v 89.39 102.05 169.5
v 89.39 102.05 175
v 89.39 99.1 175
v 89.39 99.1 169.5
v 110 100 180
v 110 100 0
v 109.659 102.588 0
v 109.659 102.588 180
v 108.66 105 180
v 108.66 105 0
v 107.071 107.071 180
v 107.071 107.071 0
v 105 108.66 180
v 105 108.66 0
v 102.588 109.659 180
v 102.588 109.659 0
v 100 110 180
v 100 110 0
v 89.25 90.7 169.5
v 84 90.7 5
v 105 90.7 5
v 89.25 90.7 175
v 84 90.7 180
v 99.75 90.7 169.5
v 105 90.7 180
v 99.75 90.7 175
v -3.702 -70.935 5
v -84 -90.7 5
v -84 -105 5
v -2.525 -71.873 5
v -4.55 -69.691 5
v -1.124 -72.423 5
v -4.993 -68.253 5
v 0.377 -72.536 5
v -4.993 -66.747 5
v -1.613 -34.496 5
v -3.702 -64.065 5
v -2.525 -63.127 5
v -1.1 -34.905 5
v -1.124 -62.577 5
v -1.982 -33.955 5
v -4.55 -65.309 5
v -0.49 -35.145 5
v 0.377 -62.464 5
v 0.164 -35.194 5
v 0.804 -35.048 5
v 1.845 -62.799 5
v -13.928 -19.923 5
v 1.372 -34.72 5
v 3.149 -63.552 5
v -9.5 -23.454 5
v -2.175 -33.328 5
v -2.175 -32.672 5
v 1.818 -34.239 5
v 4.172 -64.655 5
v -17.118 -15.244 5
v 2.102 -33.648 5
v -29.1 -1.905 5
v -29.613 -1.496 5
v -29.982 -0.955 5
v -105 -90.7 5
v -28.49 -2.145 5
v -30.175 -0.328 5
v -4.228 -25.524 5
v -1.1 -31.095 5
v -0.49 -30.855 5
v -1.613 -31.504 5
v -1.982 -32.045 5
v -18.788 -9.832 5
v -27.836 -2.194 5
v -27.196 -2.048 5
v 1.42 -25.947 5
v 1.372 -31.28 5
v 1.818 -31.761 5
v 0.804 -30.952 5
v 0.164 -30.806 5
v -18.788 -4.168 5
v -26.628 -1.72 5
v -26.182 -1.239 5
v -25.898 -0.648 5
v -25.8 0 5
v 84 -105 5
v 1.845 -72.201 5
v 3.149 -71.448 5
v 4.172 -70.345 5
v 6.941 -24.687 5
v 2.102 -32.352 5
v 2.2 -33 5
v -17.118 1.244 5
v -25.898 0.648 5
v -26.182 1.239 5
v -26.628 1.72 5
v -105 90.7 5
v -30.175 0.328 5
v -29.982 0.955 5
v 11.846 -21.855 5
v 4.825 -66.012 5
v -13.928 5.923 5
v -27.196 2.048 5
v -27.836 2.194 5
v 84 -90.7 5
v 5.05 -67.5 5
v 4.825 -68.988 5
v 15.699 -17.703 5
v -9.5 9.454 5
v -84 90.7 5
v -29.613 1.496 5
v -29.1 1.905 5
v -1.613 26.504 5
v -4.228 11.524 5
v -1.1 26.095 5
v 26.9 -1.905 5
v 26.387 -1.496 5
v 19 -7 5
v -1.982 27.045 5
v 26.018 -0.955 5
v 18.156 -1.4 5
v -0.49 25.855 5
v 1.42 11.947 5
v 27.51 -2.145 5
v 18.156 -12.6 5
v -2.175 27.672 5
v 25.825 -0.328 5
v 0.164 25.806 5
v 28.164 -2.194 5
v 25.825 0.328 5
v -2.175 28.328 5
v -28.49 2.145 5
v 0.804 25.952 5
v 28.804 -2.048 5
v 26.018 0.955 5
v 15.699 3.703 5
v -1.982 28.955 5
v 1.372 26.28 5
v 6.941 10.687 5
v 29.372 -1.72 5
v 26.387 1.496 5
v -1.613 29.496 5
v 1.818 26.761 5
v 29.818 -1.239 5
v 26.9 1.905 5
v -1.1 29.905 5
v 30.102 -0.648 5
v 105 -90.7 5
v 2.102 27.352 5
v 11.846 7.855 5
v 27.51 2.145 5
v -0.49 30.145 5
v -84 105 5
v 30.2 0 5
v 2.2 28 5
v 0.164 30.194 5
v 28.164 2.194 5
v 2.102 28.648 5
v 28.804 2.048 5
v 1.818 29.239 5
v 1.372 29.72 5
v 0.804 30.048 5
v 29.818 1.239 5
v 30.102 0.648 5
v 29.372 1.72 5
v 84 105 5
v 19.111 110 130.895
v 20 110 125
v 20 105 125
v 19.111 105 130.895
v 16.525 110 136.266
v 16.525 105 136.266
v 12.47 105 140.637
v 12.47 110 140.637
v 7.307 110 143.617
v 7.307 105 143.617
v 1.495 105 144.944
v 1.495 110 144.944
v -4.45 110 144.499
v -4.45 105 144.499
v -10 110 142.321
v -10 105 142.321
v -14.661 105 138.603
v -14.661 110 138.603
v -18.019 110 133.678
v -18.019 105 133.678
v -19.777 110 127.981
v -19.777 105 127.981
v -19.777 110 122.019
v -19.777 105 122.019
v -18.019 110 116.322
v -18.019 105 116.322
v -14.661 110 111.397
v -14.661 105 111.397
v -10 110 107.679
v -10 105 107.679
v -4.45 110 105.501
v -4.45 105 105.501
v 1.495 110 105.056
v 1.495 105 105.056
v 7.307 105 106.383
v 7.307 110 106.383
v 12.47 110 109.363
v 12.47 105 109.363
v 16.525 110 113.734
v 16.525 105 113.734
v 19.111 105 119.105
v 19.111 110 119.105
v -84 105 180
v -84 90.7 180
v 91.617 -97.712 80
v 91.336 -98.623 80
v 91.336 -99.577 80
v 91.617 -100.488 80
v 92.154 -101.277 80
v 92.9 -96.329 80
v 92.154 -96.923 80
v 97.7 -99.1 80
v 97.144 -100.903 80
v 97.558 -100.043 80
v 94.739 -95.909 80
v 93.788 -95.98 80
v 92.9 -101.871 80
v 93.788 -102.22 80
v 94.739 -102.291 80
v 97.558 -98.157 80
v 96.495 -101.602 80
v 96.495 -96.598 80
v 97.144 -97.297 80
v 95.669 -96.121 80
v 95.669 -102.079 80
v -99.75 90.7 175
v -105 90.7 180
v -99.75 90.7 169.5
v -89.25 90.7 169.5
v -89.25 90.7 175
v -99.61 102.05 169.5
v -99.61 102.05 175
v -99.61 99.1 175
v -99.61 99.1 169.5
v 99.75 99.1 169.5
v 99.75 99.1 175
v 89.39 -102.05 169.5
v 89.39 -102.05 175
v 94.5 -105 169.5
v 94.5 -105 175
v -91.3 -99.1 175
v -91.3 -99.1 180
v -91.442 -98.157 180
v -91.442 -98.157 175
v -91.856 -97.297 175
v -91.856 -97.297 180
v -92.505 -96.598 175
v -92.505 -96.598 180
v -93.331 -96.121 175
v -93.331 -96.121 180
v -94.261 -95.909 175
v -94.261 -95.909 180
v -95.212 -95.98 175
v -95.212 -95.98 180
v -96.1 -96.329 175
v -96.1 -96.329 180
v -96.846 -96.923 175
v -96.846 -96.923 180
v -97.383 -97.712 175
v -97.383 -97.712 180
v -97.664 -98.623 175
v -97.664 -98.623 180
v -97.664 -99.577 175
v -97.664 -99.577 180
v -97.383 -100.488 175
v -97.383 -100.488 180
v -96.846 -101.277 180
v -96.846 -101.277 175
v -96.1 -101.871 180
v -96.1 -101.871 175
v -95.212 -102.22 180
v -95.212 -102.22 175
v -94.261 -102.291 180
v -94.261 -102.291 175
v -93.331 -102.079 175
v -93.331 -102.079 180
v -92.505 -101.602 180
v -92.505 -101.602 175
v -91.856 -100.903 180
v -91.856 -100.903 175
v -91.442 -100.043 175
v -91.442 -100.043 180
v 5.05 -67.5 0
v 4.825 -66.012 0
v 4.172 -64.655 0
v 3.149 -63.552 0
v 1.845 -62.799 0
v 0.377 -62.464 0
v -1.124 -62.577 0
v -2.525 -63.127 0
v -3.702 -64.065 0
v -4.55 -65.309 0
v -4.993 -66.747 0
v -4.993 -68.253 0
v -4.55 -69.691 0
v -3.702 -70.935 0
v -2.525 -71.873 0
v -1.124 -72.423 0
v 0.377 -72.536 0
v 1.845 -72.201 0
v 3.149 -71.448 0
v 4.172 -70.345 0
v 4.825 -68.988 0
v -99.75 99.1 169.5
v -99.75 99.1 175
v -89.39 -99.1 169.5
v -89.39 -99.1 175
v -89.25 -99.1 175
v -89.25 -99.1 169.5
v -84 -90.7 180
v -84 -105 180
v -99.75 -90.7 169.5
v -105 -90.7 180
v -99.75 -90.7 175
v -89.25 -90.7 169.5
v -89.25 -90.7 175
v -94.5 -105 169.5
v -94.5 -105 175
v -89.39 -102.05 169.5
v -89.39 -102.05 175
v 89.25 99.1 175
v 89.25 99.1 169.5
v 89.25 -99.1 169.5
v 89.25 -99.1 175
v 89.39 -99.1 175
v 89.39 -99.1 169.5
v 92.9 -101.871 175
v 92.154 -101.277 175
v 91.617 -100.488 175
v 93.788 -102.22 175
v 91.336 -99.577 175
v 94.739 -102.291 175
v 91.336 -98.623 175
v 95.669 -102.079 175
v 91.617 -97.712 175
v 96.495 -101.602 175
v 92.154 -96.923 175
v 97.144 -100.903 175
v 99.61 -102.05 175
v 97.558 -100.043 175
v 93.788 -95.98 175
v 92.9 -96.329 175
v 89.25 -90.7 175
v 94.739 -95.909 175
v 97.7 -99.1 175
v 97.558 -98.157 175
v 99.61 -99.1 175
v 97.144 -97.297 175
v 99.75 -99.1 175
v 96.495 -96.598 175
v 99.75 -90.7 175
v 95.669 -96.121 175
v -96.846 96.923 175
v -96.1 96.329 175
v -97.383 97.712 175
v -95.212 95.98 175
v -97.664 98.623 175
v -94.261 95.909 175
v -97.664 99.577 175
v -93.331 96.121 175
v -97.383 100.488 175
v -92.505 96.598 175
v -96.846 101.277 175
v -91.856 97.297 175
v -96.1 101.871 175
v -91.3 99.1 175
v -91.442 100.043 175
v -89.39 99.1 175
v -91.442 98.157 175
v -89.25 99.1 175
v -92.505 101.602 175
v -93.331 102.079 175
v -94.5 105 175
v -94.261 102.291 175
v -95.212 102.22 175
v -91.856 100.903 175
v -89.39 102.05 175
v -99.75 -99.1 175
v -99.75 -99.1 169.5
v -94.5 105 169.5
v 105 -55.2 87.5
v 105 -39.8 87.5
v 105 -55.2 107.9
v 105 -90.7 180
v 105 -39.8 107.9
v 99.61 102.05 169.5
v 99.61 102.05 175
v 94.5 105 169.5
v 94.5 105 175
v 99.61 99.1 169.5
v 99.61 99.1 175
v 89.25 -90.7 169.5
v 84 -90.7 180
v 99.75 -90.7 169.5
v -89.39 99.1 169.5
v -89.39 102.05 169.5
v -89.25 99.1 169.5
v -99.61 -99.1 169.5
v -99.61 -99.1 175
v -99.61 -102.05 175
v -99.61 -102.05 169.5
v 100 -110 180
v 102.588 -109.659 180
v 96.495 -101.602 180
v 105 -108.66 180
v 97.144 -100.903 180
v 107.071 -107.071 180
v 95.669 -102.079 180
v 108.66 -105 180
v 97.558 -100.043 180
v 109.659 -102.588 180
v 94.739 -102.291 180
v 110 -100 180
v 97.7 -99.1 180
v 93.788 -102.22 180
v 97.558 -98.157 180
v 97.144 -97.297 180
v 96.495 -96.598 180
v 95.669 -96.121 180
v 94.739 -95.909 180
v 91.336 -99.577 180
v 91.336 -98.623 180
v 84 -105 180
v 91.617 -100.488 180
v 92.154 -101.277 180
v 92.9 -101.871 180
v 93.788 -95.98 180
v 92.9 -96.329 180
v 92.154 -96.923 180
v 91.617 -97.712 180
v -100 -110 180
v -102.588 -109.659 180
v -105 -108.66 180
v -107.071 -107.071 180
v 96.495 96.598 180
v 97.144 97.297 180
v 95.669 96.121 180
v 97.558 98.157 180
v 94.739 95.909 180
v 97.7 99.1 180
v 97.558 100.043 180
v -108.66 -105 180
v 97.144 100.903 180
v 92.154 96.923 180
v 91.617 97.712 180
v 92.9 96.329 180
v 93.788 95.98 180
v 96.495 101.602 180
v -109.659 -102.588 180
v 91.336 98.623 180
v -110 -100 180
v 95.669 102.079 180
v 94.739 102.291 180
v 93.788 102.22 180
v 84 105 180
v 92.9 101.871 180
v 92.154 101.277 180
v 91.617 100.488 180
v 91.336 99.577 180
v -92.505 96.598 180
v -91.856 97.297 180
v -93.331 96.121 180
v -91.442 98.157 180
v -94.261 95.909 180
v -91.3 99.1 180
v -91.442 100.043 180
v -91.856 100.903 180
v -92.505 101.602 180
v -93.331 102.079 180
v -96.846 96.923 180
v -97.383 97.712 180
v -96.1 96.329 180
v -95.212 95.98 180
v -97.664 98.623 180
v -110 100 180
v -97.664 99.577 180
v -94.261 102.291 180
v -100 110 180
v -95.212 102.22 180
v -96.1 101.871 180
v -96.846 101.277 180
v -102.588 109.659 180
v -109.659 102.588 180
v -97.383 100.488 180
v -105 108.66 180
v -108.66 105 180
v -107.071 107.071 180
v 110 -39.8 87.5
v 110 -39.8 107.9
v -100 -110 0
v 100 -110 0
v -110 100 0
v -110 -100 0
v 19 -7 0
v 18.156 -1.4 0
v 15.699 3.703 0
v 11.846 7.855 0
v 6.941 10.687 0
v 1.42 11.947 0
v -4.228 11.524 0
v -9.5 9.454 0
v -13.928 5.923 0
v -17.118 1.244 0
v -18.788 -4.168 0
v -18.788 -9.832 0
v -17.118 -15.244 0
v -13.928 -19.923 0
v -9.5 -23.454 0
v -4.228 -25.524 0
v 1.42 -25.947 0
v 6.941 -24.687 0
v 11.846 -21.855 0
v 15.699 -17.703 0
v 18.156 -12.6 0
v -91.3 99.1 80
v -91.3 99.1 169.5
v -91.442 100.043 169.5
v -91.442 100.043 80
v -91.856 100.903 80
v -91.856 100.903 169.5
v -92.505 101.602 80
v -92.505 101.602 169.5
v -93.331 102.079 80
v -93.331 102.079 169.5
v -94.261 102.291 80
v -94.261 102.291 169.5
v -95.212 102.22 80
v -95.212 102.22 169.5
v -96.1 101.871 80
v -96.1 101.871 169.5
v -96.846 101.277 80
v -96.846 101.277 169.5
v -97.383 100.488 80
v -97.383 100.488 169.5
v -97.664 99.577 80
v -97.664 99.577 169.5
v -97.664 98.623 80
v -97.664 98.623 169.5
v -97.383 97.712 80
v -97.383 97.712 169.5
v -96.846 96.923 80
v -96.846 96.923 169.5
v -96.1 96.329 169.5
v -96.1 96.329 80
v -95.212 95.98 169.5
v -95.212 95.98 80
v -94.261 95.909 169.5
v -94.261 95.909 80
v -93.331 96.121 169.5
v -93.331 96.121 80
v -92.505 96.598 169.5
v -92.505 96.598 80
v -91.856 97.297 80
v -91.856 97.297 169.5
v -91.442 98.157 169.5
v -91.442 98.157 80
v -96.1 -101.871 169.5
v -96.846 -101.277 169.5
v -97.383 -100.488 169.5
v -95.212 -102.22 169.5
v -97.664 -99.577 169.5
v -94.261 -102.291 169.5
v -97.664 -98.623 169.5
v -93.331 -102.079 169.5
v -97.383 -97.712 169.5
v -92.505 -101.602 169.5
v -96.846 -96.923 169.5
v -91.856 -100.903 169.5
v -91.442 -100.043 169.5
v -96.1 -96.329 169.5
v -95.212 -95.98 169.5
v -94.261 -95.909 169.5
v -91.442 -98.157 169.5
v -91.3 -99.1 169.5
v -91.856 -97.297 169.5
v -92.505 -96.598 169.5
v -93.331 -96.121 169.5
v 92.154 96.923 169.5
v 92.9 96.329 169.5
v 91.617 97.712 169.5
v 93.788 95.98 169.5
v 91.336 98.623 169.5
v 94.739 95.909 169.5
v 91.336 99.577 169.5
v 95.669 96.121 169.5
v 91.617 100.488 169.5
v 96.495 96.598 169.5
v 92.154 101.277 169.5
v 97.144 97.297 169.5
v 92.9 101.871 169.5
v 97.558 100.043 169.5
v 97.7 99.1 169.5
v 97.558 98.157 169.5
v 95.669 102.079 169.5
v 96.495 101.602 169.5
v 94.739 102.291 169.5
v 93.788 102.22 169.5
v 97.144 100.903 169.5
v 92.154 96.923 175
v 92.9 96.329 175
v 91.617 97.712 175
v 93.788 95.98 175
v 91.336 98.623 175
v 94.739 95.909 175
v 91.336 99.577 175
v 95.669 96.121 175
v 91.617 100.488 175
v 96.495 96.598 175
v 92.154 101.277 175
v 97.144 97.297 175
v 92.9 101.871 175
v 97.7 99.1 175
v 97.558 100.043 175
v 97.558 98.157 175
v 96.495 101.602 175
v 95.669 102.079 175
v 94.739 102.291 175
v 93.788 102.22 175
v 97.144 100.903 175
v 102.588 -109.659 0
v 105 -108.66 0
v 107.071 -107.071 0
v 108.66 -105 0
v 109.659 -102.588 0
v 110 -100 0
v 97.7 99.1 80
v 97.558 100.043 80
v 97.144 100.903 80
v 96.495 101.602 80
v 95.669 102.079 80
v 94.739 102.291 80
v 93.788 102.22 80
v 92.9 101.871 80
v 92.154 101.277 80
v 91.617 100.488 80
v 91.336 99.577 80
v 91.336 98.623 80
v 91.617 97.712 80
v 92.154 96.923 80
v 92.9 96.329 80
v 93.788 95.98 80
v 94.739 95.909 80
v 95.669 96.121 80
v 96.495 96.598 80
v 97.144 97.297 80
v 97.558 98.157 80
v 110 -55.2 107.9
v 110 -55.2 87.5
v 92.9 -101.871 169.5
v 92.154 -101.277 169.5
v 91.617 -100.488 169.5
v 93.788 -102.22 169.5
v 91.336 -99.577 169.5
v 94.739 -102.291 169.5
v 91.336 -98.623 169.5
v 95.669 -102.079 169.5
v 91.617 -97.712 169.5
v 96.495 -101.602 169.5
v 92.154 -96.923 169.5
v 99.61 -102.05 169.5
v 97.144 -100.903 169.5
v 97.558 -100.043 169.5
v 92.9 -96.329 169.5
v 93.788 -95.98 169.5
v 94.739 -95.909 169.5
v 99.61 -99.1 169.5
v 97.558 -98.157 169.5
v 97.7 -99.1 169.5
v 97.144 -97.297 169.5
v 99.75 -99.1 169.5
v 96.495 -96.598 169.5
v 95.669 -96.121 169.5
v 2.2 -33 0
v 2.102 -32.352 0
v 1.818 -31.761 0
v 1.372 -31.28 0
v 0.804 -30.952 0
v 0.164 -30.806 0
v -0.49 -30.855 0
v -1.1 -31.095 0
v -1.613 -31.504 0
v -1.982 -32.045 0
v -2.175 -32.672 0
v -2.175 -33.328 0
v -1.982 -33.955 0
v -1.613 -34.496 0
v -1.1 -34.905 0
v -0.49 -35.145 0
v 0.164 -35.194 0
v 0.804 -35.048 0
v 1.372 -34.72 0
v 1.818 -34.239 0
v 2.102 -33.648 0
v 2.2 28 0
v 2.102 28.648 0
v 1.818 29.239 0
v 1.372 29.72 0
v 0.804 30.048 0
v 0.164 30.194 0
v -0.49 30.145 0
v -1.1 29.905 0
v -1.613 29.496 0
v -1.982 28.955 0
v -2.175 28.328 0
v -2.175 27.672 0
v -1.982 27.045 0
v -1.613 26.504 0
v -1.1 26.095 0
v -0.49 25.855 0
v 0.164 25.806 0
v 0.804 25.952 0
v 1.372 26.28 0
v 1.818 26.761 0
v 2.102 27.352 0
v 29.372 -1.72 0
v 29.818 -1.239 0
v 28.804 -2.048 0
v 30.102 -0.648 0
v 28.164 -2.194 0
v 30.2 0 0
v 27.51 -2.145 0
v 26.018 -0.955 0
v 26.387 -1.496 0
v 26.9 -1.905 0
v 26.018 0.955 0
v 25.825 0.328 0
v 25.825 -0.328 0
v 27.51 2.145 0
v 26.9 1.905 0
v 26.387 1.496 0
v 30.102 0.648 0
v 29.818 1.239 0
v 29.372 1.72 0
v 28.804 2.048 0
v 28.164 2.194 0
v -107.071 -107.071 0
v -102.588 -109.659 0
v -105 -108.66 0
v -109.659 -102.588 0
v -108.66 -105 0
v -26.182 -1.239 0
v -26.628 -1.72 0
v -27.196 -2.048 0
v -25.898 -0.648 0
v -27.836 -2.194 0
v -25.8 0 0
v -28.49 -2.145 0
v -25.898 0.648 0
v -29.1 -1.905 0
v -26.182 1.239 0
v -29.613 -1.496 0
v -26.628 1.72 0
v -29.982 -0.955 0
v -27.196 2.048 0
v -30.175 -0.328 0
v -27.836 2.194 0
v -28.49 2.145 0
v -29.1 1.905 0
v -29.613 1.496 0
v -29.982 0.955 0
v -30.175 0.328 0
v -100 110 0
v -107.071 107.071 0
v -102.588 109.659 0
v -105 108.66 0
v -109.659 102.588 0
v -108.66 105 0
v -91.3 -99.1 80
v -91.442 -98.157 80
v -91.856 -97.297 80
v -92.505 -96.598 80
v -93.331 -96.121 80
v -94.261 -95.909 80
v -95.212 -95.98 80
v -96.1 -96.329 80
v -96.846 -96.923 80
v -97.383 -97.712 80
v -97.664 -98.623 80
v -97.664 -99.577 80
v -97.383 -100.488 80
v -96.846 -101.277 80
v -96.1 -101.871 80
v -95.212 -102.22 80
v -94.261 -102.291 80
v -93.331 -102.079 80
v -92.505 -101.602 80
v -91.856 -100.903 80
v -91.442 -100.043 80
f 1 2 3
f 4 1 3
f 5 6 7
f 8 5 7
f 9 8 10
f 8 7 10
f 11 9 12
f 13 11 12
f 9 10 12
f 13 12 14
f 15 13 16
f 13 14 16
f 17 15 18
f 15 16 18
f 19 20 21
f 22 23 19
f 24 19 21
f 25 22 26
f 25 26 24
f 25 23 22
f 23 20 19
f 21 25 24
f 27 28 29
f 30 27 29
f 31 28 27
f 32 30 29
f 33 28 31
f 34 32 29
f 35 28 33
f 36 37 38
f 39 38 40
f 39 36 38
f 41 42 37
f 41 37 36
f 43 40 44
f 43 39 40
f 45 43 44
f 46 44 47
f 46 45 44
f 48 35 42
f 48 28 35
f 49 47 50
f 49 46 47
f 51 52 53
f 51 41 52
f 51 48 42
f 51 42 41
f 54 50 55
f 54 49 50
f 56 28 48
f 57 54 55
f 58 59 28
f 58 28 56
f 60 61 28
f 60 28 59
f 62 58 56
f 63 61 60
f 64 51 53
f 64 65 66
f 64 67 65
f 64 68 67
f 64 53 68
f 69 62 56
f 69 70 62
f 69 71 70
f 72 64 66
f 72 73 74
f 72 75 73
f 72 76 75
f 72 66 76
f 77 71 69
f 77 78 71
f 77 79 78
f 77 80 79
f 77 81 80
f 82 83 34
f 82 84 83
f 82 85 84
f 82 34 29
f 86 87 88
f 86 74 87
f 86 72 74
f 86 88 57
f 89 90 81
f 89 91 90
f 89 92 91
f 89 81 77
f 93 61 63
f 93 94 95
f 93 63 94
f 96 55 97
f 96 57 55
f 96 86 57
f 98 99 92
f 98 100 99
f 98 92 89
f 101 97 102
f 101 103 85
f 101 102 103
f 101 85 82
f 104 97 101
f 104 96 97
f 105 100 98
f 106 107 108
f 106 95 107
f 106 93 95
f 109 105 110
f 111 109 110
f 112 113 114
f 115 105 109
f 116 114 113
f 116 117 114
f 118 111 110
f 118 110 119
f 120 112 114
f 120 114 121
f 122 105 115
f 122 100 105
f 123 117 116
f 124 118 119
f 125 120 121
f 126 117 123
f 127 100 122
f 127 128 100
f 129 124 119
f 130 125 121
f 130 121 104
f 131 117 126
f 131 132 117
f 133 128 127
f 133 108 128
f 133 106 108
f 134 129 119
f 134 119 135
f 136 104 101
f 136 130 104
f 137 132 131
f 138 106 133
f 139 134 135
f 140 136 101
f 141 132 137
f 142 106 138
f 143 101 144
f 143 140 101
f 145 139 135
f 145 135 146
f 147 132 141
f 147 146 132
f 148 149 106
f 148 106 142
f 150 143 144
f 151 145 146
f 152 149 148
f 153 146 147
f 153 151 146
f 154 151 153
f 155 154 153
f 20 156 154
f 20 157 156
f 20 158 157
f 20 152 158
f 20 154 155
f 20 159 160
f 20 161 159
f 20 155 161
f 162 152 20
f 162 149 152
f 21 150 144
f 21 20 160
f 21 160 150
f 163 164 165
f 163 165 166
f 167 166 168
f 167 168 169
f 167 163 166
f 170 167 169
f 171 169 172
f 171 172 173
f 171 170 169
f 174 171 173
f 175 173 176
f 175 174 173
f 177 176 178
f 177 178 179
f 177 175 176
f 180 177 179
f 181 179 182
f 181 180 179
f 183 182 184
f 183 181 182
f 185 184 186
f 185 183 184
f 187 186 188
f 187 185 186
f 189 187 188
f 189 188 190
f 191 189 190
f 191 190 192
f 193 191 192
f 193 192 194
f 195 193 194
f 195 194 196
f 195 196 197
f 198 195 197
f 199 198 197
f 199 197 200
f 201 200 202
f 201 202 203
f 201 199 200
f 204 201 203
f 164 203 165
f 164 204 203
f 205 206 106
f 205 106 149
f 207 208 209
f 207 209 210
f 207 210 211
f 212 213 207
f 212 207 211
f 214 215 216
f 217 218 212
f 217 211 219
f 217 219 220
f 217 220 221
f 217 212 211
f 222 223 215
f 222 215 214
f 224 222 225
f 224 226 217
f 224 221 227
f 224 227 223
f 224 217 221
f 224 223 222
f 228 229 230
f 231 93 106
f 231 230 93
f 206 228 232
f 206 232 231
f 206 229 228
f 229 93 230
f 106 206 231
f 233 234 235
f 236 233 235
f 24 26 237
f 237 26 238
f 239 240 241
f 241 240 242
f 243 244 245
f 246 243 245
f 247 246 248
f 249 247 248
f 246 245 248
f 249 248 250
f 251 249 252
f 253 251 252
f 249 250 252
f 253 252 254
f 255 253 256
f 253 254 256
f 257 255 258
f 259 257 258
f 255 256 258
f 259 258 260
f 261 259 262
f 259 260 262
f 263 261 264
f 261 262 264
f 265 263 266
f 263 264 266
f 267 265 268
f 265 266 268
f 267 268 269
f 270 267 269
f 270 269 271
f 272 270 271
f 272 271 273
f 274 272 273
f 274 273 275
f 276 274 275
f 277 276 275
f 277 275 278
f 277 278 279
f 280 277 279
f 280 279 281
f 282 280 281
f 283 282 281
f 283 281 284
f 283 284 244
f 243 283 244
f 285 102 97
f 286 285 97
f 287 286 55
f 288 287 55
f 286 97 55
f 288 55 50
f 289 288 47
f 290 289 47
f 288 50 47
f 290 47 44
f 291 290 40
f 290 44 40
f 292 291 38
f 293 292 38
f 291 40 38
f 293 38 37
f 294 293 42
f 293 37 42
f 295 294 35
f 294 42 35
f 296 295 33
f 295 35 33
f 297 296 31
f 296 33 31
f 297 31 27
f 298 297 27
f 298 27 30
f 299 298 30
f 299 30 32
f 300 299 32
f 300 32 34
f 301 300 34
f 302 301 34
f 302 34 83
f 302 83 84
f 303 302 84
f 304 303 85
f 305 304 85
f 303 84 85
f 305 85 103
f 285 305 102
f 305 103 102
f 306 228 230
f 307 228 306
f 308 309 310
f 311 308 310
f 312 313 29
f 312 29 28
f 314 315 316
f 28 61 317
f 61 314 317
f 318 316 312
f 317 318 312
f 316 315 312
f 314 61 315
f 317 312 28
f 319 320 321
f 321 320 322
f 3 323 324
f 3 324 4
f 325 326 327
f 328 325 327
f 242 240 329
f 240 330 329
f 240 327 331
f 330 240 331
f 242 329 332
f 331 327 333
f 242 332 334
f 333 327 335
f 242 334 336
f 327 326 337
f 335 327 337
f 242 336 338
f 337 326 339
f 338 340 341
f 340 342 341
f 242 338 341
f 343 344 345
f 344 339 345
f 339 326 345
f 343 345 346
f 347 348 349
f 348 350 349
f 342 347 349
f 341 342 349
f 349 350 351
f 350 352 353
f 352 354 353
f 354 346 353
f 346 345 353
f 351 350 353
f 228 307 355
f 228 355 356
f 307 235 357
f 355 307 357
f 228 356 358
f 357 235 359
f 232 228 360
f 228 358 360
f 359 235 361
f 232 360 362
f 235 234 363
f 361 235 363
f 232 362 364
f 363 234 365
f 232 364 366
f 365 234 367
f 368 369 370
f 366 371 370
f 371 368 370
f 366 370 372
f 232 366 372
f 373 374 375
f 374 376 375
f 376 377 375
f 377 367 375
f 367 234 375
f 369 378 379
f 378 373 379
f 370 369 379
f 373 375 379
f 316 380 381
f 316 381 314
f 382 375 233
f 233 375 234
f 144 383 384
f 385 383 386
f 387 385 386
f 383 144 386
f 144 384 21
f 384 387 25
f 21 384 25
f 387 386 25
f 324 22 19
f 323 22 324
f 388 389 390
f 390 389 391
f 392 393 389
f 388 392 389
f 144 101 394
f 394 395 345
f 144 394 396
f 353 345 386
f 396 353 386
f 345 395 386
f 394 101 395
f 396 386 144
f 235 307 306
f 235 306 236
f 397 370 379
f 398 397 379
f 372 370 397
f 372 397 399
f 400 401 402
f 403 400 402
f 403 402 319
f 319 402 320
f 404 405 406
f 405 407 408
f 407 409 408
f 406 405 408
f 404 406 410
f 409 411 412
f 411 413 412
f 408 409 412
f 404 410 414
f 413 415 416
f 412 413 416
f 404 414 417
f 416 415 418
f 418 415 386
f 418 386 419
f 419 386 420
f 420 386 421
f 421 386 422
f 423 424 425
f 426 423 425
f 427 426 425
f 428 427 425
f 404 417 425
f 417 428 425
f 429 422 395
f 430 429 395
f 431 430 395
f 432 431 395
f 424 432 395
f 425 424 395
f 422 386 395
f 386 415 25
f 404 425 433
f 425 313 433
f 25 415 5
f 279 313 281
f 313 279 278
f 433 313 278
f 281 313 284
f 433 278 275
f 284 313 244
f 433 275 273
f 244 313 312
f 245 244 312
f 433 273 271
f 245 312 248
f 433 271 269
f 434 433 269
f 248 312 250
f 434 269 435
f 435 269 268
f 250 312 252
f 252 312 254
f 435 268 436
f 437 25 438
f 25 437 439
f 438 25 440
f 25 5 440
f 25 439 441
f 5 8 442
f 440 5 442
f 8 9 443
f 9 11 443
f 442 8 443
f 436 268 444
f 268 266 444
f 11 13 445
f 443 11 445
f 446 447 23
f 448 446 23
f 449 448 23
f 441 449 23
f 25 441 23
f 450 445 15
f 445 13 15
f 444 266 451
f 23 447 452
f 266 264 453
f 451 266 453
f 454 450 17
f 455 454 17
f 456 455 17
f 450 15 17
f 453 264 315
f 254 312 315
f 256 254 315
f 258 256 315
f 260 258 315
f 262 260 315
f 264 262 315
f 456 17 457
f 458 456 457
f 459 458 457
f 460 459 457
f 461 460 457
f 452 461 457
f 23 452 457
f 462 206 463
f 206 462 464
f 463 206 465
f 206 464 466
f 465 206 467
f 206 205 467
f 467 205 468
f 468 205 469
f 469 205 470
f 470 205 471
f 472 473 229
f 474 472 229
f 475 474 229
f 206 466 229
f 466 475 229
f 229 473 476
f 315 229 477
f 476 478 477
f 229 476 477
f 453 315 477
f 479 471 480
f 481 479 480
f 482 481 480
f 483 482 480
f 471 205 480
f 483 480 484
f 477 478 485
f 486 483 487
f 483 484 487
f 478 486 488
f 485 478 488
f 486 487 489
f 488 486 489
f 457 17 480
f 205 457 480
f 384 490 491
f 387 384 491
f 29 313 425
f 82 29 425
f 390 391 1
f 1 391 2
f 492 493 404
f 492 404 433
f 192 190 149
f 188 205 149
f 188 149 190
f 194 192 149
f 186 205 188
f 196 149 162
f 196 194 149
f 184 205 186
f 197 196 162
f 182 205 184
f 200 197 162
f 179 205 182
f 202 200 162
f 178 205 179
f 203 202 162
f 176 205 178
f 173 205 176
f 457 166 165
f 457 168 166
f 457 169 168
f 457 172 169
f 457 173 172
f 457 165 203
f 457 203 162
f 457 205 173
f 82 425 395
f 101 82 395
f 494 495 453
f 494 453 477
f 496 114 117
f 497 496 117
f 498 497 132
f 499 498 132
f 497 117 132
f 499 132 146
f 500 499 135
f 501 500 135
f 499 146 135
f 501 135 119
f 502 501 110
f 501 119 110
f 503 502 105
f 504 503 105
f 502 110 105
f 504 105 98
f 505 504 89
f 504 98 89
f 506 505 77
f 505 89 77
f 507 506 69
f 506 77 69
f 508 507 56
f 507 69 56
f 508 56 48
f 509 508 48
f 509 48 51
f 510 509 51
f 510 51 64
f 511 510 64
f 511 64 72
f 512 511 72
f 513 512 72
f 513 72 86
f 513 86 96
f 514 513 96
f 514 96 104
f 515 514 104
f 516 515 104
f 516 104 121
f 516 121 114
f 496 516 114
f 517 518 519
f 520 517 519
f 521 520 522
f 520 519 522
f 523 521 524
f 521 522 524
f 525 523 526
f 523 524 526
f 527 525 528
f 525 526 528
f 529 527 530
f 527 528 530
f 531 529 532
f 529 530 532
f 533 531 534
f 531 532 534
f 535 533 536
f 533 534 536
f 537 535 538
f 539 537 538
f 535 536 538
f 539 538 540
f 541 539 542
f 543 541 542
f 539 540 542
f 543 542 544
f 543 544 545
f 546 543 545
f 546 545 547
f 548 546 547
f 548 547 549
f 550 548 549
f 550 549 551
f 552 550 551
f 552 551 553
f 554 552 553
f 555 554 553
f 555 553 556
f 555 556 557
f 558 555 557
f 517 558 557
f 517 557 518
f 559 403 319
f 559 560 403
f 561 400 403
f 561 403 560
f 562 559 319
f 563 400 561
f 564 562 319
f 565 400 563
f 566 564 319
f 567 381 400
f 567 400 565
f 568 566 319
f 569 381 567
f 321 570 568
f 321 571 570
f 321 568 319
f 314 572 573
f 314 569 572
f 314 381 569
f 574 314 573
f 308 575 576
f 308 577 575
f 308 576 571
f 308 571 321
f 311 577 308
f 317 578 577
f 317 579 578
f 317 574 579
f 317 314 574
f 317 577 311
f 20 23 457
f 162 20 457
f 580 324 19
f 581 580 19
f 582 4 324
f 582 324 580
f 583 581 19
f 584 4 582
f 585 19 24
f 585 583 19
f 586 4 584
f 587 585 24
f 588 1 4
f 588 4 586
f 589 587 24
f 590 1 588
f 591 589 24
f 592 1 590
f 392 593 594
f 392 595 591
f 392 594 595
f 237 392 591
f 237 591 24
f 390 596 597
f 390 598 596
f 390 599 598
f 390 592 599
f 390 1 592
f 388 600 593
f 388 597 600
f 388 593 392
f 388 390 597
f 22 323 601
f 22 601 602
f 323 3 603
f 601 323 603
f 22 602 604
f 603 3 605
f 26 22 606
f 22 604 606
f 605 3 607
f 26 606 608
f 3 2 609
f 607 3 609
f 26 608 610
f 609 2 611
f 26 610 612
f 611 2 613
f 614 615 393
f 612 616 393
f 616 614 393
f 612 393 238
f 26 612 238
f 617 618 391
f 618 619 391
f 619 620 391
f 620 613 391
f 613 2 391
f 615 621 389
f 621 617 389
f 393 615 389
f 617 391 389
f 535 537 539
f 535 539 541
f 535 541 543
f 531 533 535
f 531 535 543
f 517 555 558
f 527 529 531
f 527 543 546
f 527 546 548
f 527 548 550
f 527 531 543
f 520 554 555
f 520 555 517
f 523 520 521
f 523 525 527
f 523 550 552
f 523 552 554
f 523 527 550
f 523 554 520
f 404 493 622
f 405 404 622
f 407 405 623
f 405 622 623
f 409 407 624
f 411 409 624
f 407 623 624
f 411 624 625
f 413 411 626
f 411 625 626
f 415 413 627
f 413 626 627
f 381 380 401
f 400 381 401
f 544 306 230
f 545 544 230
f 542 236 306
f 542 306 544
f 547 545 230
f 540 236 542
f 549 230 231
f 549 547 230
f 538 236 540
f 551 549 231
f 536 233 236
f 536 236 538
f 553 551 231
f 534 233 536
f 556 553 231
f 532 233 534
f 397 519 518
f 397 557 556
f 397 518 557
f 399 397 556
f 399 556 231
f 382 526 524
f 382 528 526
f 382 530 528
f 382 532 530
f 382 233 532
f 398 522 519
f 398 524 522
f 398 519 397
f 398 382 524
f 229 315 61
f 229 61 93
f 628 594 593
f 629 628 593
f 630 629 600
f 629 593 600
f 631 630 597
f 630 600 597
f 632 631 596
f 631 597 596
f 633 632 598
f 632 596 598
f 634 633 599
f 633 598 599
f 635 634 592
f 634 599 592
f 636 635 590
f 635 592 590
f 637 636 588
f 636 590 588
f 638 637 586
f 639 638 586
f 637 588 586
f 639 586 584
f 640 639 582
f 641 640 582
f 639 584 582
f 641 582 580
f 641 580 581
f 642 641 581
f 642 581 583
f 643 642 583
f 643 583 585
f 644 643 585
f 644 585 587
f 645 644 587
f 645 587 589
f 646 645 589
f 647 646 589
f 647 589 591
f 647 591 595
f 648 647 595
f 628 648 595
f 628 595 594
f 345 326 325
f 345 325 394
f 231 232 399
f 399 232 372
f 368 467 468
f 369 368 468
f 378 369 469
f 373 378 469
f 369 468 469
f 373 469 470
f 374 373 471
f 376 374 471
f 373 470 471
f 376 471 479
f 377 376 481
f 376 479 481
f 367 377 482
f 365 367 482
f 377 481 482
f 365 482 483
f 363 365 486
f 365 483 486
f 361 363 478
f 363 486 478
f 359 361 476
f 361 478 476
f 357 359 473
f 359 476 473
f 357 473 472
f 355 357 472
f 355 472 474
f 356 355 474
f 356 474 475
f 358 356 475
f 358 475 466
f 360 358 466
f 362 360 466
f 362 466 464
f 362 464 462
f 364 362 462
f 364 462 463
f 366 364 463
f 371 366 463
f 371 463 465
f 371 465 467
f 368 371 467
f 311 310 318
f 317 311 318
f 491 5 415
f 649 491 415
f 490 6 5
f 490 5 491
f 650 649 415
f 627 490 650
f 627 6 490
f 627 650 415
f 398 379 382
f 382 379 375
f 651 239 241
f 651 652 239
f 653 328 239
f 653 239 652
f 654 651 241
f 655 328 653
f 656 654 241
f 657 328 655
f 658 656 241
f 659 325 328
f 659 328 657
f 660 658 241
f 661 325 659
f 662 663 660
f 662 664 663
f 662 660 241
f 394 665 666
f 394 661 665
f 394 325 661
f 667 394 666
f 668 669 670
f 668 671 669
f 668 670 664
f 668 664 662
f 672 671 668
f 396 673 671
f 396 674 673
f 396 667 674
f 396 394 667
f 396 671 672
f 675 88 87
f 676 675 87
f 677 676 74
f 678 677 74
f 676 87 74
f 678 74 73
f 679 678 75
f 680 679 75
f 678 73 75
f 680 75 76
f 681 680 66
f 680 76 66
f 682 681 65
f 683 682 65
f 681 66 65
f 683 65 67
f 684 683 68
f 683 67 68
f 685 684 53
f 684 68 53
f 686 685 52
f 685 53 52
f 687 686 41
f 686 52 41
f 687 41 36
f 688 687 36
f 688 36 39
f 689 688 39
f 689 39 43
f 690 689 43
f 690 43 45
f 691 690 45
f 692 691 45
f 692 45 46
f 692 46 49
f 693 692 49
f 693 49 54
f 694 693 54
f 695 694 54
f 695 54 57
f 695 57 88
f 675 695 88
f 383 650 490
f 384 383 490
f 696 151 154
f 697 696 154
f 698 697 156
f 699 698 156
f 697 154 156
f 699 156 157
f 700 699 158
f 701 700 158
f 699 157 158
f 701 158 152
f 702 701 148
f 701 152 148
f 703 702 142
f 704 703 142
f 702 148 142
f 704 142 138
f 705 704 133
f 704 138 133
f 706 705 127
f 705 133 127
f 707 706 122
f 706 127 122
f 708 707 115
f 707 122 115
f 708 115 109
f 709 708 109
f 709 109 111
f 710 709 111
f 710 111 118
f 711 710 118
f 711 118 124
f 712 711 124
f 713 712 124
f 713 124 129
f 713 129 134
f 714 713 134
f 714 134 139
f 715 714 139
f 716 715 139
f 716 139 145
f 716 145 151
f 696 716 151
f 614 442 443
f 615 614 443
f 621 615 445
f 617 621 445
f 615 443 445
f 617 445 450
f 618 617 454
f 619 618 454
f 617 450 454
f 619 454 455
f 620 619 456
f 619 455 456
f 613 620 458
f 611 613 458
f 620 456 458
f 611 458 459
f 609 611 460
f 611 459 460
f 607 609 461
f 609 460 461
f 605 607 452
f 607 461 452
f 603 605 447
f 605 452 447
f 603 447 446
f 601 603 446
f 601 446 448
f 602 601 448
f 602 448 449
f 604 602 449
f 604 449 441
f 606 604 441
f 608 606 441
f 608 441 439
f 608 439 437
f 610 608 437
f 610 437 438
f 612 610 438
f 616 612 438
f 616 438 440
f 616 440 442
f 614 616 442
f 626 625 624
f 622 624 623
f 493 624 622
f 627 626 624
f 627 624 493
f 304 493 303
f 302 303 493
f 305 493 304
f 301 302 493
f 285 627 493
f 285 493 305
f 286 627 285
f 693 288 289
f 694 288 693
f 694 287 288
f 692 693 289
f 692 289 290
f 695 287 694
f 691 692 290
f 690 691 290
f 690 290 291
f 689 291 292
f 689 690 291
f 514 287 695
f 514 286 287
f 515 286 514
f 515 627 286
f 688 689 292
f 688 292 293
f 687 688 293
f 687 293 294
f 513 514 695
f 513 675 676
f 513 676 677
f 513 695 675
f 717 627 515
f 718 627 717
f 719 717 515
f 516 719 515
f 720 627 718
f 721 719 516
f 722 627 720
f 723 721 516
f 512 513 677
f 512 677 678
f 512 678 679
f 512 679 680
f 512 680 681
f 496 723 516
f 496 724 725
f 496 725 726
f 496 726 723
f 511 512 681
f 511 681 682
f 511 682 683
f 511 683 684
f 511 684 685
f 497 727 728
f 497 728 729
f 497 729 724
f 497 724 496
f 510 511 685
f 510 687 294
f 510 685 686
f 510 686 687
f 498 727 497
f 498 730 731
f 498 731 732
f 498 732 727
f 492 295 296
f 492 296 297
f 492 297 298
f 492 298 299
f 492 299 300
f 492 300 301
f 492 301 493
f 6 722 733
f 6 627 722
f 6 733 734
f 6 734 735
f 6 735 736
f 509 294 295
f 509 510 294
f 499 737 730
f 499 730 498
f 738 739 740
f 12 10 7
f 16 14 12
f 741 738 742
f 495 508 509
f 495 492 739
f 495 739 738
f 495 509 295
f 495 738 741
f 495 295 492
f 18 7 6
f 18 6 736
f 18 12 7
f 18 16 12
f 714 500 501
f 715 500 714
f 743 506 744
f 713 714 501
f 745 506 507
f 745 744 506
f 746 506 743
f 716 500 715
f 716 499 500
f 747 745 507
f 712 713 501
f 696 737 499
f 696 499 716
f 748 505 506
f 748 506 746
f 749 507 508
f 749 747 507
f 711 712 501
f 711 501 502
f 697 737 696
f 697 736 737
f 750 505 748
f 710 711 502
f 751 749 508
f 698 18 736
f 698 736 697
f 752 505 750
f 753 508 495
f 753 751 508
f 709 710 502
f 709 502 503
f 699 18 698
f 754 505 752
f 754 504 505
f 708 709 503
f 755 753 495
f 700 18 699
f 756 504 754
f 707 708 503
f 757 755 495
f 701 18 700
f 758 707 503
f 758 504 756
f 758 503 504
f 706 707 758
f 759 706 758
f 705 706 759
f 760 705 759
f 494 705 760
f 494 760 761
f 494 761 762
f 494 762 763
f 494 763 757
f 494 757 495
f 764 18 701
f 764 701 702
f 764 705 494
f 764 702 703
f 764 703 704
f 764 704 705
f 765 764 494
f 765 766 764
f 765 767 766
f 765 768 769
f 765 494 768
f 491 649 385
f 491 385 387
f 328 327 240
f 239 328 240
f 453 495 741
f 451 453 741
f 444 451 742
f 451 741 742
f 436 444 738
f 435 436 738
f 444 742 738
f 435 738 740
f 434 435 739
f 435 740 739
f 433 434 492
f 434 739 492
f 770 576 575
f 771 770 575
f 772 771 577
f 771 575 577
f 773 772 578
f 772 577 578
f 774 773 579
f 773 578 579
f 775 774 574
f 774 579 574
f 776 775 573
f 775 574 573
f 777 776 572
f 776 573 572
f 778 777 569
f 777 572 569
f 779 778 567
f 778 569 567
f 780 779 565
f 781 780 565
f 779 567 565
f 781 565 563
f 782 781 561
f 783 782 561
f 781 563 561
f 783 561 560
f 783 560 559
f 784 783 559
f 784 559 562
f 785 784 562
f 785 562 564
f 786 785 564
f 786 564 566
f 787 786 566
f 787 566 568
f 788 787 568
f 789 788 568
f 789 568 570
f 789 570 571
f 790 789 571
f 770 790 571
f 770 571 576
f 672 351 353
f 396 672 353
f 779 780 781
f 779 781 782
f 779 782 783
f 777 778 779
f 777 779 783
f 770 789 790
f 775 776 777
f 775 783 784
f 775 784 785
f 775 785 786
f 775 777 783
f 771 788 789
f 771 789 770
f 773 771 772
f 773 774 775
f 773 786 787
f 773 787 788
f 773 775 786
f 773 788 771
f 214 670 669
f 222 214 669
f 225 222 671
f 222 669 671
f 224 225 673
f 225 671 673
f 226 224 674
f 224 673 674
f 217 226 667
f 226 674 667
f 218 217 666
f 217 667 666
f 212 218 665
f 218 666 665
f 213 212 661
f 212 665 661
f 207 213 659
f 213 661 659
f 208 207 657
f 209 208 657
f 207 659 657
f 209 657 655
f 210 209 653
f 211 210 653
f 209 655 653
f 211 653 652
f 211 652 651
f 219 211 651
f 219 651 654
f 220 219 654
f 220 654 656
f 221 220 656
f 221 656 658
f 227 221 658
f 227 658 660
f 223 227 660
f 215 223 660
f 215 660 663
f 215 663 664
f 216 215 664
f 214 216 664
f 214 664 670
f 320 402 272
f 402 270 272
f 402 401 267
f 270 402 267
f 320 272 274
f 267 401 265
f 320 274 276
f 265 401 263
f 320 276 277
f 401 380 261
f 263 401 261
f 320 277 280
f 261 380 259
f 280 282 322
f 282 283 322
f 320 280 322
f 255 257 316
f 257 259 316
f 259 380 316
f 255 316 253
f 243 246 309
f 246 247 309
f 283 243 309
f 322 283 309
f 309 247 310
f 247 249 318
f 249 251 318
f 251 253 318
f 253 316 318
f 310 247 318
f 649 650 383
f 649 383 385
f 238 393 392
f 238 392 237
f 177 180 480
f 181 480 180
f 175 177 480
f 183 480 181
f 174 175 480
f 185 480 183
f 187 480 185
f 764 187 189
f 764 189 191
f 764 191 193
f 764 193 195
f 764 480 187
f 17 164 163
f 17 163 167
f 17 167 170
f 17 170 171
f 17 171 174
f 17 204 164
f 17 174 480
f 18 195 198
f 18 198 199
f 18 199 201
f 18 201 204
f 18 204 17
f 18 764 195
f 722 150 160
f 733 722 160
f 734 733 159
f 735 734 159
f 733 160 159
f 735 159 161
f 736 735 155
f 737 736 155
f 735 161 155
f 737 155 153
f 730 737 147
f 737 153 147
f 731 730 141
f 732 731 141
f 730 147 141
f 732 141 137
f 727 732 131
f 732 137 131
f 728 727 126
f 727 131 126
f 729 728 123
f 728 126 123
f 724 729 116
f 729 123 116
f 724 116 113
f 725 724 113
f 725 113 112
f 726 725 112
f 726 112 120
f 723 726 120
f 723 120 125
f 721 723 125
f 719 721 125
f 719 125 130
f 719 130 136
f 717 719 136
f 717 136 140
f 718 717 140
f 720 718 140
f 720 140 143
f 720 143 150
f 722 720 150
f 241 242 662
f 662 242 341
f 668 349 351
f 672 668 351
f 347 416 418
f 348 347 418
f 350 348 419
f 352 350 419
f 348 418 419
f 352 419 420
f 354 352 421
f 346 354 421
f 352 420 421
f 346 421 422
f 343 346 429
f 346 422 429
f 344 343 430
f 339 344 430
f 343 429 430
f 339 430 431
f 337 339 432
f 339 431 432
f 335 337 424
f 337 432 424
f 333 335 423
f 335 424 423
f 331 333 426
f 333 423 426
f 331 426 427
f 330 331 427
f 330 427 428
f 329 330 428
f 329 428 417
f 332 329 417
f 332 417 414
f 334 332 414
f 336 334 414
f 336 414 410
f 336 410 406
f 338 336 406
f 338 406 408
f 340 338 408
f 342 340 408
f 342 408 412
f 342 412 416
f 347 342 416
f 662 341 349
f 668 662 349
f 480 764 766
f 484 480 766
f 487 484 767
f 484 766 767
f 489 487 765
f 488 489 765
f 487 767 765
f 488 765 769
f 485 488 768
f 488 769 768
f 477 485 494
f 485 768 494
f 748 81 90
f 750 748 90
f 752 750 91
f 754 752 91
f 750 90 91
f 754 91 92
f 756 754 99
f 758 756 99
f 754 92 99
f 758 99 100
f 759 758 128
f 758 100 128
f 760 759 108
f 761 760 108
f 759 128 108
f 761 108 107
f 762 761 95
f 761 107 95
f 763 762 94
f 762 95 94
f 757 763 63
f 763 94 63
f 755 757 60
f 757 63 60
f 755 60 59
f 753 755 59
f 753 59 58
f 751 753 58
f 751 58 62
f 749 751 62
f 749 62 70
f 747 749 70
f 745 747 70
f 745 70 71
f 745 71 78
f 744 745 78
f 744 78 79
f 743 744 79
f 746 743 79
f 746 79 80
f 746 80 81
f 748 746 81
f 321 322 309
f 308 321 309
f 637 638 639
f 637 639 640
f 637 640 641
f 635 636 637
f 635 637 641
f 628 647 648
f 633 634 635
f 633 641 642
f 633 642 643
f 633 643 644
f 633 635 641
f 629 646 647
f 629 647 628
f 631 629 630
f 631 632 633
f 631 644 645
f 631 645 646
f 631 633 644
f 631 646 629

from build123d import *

# Parameters (mm, degrees)
PAD_DEPTH       = 180
SKETCH001_W     = 168
SKETCH001_H     = 210
POCKET_DEPTH    = 175
SKETCH002_W     = 210
SKETCH002_H     = 181.4
POCKET001_DEPTH = 175
POCKET002_DEPTH = 5.5
SKETCH004_W     = 10.5
SKETCH004_H     = 21.8
POCKET003_DEPTH = 5.5
SKETCH005_R     = 3.2
POCKET004_DEPTH = 100
SKETCH006_W     = 15.4
SKETCH006_H     = 20.4
POCKET005_DEPTH = 5
SKETCH007_R     = 20
POCKET006_DEPTH = 5
SKETCH008_R     = 19
SKETCH008_R_2   = 2.2
POCKET007_DEPTH = 180.001
SKETCH052_R     = 5.049841
POCKET042_DEPTH = 5


with BuildPart() as part:
    # Sketch → Pad (new body)
    with BuildSketch(Plane.XY):
        with BuildLine():
            Line((-100, 110), (100, 110))
            ThreePointArc((110, 100), (107.071068, 107.071068), (100, 110))
            Line((110, 100), (110, -100))
            ThreePointArc((100, -110), (107.071068, -107.071068), (110, -100))
            Line((100, -110), (-100, -110))
            ThreePointArc((-110, -100), (-107.071068, -107.071068), (-100, -110))
            Line((-110, -100), (-110, 100))
            ThreePointArc((-100, 110), (-107.071068, 107.071068), (-110, 100))
        make_face()
    extrude(amount=PAD_DEPTH)

    # Sketch001 (on DatumPlane) → Pocket (cut)
    with BuildSketch(Plane.XY.offset(180)):
        Rectangle(SKETCH001_W, SKETCH001_H)
    extrude(amount=-POCKET_DEPTH, mode=Mode.SUBTRACT)

    # Sketch002 (on DatumPlane) → Pocket001 (cut)
    with BuildSketch(Plane.XY.offset(180)):
        Rectangle(SKETCH002_W, SKETCH002_H)
    extrude(amount=-POCKET001_DEPTH, mode=Mode.SUBTRACT)

    # Sketch003 (on DatumPlane) → Pocket002 (cut)
    with BuildSketch(Plane.XY.offset(175)):
        Polygon((89.39045, 96.15), (94.5, 93.2), (99.60955, 96.15), (99.60955, 102.05), (94.5, 105), (89.39045, 102.05), align=None)
        Polygon((99.60955, -102.05), (99.60955, -96.15), (94.5, -93.2), (89.39045, -96.15), (89.39045, -102.05), (94.5, -105), align=None)
        Polygon((-89.39045, -102.05), (-89.39045, -96.15), (-94.5, -93.2), (-99.60955, -96.15), (-99.60955, -102.05), (-94.5, -105), align=None)
        Polygon((-89.39045, 96.15), (-89.39045, 102.05), (-94.5, 105), (-99.60955, 102.05), (-99.60955, 96.15), (-94.5, 93.2), align=None)
    extrude(amount=-POCKET002_DEPTH, mode=Mode.SUBTRACT)

    # Sketch004 (on DatumPlane) → Pocket003 (cut)
    with BuildSketch(Plane.XY.offset(175)):
        with Locations((-94.5, 88.2)):
            Rectangle(SKETCH004_W, SKETCH004_H)
        with Locations((94.5, 88.2)):
            Rectangle(SKETCH004_W, SKETCH004_H)
        with Locations((-94.5, -88.2)):
            Rectangle(SKETCH004_W, SKETCH004_H)
        with Locations((94.5, -88.2)):
            Rectangle(SKETCH004_W, SKETCH004_H)
    extrude(amount=-POCKET003_DEPTH, mode=Mode.SUBTRACT)

    # Sketch005 (on DatumPlane) → Pocket004 (cut)
    with BuildSketch(Plane.XY.offset(180)):
        with Locations((-94.5, 99.1)):
            Circle(SKETCH005_R)
        with Locations((94.5, 99.1)):
            Circle(SKETCH005_R)
        with Locations((-94.5, -99.1)):
            Circle(SKETCH005_R)
        with Locations((94.5, -99.1)):
            Circle(SKETCH005_R)
    extrude(amount=-POCKET004_DEPTH, mode=Mode.SUBTRACT)

    # Sketch006 (on DatumPlane) → Pocket005 (cut)
    with BuildSketch(Plane.YZ.offset(110)):
        with Locations((-47.5, 97.7)):
            Rectangle(SKETCH006_W, SKETCH006_H)
    extrude(amount=-POCKET005_DEPTH, mode=Mode.SUBTRACT)

    # Sketch007 (on DatumPlane) → Pocket006 (cut)
    with BuildSketch(Plane.XZ.offset(-110)):
        with Locations((0, 125)):
            Circle(SKETCH007_R)
    extrude(amount=POCKET006_DEPTH, mode=Mode.SUBTRACT)

    # Sketch008 (on DatumPlane) → Pocket007 (cut, through all)
    with BuildSketch(Plane.XY.offset(180)):
        with Locations((0, -7)):
            Circle(SKETCH008_R)
        with Locations((0, 28)):
            Circle(SKETCH008_R_2)
        with Locations((28, 0)):
            Circle(SKETCH008_R_2)
        with Locations((-28, 0)):
            Circle(SKETCH008_R_2)
        with Locations((0, -33)):
            Circle(SKETCH008_R_2)
    extrude(amount=-POCKET007_DEPTH, mode=Mode.SUBTRACT)

    # Sketch052 (on Face37 of Pocket007) → Pocket042 (cut)
    with BuildSketch(Plane.XY.offset(5)):
        with Locations((0, -67.5)):
            Circle(SKETCH052_R)
    extrude(amount=-POCKET042_DEPTH, mode=Mode.SUBTRACT)


solid = part.part
